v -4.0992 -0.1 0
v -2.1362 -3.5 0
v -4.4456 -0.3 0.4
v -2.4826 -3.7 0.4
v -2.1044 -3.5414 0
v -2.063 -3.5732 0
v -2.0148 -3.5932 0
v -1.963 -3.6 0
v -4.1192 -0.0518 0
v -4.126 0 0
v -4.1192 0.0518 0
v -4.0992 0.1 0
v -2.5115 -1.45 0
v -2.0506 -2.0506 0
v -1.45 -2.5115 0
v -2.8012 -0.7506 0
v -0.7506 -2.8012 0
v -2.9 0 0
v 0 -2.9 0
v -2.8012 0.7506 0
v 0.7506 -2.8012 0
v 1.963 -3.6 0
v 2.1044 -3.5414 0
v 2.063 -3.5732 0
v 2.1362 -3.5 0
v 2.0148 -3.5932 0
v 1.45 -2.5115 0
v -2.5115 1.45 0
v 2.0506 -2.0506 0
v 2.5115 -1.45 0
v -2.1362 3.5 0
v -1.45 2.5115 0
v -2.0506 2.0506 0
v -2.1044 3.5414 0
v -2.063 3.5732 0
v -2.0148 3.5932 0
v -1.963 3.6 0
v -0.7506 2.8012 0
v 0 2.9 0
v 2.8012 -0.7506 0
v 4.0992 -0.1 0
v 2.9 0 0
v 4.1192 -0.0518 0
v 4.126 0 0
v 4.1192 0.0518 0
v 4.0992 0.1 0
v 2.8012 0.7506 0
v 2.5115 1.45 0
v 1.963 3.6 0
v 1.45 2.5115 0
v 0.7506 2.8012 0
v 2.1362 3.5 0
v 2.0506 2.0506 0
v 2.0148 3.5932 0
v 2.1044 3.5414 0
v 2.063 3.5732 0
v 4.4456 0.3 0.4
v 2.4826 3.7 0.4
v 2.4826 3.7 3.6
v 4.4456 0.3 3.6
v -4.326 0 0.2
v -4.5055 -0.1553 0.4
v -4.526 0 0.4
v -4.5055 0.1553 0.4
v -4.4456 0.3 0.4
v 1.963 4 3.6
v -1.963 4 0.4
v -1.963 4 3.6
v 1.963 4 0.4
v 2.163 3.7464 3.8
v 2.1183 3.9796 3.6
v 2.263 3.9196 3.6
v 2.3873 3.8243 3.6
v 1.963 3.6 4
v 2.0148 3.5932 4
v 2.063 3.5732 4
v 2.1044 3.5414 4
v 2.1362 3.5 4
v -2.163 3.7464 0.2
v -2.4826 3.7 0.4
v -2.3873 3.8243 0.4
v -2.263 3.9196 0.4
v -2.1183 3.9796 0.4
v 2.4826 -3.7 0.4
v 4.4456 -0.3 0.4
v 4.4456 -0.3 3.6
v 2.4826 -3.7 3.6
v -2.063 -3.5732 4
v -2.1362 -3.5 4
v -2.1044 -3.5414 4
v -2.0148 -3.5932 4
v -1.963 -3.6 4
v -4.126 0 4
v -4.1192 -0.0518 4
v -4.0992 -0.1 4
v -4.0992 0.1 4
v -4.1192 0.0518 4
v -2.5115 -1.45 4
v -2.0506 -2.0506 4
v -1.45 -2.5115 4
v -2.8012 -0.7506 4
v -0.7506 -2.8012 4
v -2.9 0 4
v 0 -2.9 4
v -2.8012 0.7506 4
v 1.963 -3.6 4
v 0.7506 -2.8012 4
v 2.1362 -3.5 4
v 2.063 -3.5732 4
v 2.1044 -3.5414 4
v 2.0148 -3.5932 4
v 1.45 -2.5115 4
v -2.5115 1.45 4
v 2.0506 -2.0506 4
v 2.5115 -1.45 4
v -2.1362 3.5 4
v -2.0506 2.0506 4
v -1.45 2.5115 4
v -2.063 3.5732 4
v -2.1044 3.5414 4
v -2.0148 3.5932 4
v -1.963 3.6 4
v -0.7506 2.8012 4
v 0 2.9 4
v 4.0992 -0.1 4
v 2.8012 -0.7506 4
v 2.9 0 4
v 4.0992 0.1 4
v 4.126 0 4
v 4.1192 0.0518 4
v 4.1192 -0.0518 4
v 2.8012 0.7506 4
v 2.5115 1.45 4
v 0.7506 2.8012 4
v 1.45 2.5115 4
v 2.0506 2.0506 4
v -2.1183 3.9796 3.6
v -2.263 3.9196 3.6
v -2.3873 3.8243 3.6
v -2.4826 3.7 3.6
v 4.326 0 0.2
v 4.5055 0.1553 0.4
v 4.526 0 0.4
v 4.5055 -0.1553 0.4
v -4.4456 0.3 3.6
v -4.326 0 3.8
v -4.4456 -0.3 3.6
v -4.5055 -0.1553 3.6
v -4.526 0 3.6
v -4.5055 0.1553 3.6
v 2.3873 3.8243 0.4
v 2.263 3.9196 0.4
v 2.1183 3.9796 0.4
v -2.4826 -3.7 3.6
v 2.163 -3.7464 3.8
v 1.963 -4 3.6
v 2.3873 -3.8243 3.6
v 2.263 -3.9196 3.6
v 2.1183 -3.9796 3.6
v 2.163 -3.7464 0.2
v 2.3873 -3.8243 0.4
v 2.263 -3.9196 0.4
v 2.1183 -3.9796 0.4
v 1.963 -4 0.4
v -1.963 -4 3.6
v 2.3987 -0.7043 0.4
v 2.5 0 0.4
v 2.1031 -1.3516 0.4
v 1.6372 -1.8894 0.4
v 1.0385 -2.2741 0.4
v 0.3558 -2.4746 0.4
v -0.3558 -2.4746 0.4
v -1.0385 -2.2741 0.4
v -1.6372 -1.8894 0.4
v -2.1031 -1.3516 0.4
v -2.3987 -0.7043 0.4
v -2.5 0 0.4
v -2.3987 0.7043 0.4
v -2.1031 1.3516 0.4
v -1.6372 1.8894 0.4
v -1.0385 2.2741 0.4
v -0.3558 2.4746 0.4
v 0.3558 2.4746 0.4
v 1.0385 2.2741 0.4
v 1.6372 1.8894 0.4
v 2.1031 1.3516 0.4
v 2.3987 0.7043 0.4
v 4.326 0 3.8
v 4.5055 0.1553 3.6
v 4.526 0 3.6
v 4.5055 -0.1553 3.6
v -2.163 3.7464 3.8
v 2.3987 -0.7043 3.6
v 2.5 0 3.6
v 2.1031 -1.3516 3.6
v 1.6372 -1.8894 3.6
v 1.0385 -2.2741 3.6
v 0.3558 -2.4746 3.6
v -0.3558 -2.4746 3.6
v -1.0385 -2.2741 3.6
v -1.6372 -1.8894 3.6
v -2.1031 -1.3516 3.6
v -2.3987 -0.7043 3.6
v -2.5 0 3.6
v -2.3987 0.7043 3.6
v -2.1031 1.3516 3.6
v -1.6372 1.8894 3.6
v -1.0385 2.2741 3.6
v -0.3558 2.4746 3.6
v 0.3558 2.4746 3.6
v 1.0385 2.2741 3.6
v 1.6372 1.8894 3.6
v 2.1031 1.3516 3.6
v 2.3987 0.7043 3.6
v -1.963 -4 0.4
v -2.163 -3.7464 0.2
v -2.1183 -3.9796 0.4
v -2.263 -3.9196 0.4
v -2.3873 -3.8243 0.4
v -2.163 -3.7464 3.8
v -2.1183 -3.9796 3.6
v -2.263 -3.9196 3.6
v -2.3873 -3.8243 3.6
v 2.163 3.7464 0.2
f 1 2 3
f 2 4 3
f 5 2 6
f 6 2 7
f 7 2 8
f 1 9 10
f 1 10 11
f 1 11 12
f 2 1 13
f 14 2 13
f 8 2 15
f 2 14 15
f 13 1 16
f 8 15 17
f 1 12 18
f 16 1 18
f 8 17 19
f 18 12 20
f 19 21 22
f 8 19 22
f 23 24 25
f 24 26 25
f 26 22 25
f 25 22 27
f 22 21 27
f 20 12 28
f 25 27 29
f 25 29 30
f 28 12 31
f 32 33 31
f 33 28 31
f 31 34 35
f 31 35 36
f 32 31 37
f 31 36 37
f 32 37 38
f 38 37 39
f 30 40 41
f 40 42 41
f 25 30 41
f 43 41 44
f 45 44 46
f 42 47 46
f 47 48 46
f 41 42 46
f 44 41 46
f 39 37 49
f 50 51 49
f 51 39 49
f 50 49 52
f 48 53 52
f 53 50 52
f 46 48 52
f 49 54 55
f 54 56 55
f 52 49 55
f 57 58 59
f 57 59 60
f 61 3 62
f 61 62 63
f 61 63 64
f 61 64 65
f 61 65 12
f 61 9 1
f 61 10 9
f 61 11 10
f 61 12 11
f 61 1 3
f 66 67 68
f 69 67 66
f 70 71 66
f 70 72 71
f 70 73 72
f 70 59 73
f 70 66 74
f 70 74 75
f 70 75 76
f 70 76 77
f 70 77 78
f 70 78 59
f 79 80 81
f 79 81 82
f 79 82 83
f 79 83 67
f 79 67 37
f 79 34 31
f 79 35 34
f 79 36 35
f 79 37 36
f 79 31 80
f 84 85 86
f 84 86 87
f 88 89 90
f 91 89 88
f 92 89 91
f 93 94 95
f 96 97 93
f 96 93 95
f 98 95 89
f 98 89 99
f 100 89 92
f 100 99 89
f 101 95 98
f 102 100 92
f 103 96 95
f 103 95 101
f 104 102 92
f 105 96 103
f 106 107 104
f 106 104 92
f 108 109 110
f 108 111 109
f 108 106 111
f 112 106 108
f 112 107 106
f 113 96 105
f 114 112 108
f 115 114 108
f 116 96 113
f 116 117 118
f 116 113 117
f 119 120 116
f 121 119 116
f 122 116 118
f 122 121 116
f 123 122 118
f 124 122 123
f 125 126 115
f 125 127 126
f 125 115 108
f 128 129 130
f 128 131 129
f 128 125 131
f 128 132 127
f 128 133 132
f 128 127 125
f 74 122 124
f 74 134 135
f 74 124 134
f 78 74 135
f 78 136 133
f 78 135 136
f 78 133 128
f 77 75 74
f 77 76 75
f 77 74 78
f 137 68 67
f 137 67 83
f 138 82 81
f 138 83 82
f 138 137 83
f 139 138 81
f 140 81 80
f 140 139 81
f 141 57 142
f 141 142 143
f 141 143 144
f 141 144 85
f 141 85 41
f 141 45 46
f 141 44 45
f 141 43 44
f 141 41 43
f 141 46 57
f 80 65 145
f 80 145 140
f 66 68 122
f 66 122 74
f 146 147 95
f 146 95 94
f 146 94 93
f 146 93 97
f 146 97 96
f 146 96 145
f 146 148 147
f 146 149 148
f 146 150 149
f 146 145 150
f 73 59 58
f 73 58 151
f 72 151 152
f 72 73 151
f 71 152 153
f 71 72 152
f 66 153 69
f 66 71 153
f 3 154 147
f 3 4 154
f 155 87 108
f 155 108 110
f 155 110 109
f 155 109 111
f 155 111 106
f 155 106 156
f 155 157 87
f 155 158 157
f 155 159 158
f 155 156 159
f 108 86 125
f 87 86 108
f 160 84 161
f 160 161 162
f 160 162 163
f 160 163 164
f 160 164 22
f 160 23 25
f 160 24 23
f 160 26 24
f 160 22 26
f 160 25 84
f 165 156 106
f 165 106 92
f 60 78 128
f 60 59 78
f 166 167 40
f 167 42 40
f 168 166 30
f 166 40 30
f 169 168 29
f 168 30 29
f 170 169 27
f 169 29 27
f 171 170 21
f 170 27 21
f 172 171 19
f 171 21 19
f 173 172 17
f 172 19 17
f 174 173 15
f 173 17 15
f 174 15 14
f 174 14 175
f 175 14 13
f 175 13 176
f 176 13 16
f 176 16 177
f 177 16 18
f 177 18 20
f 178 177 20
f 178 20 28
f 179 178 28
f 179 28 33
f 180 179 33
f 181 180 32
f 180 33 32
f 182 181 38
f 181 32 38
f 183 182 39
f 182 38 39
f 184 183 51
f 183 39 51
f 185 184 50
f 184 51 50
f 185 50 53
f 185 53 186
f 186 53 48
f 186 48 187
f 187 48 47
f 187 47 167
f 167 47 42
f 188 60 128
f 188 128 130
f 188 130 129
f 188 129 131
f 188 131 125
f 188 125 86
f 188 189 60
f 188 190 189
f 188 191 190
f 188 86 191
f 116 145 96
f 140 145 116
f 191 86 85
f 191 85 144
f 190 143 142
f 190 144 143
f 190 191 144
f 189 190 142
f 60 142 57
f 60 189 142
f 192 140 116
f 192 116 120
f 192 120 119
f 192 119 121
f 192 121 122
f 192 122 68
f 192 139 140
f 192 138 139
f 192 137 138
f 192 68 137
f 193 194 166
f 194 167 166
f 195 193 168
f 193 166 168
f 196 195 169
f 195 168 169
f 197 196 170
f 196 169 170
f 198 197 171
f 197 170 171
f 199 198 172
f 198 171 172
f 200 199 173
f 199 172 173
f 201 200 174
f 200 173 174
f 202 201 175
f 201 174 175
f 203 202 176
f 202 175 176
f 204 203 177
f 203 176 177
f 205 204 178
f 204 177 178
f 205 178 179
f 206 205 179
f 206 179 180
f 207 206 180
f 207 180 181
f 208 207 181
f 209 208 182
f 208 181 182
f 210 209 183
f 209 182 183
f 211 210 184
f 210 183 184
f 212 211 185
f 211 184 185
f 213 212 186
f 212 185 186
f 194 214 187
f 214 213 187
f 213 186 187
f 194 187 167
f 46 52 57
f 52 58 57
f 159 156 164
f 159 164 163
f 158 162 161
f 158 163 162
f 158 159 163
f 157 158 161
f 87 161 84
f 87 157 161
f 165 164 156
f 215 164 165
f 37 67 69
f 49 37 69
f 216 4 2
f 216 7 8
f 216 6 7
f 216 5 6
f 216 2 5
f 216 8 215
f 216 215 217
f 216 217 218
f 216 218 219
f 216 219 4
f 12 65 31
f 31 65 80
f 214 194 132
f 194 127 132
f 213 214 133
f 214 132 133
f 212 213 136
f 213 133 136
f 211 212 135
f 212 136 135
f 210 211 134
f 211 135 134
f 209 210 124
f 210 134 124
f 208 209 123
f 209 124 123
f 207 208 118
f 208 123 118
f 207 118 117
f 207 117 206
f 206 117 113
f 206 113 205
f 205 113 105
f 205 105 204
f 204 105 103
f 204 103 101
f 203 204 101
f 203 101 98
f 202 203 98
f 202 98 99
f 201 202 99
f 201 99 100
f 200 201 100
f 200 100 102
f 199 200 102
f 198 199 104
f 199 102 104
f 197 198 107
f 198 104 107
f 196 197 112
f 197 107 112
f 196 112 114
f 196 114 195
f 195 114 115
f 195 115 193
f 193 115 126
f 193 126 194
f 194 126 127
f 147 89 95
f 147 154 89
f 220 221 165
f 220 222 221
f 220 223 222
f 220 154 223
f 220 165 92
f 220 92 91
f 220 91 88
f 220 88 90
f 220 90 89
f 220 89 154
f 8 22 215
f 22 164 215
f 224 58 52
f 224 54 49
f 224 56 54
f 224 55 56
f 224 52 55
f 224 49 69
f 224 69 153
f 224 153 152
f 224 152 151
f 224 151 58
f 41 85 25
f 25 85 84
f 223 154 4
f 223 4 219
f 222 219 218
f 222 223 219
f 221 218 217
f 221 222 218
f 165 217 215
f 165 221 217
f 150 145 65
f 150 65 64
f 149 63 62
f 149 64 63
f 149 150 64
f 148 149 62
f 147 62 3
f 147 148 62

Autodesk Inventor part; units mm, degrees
ref_plane "YZ Plane" through (0, 0, 0) normal (1, 0, 0) x (0, 1, 0)
ref_plane "XZ Plane" through (0, 0, 0) normal (0, 1, 0) x (-1, 0, 0)
ref_plane "XY Plane" through (0, 0, 0) normal (0, 0, 1) x (1, 0, 0)
sketch "Эскиз1" plane through (0, 0, 0) normal (0, 0, 1) x (1, 0, 0)
  circle A0 centre (0, 0) radius 2.5
  line L0 (2.3094, 4) -> (4.6188, 0)
  line L1 (4.6188, 0) -> (2.3094, -4)
  line L2 (2.3094, -4) -> (-2.3094, -4)
  line L3 (-2.3094, -4) -> (-4.6188, 0)
  line L4 (-4.6188, 0) -> (-2.3094, 4)
  line L5 (-2.3094, 4) -> (2.3094, 4)
  dimension "d0" = 5
  dimension "d1" = 8
extrude "Выдавливание1" add sketch "Эскиз1" along normal blind 4
fillet "Сопряжение1" radius 0.6 6 edges at (-4.6188, 0, 2) (-2.3094, -4, 2) (2.3094, -4, 2) (4.6188, 0, 2) (2.3094, 4, 2) (-2.3094, 4, 2)
chamfer "Фаска1" distance 0.4 angle 45 26 edges at (0, 4, 0) (-2.263, 3.9196, 0) (-3.4641, 2, 0) (-4.526, 0, 0) (-3.4641, -2, 0) (-2.263, -3.9196, 0) (0, -4, 0) (2.263, -3.9196, 0) (3.4641, -2, 0) (4.526, 0, 0) (3.4641, 2, 0) (2.263, 3.9196, 0) (0, 4, 4) (-2.263, 3.9196, 4) (-3.4641, 2, 4) (-4.526, 0, 4) (-3.4641, -2, 4) (-2.263, -3.9196, 4) (0, -4, 4) (2.263, -3.9196, 4) (3.4641, -2, 4) (4.526, 0, 4) (3.4641, 2, 4) (2.263, 3.9196, 4) (-2.5, 0, 4) (-2.5, 0, 0)
properties part number "Гайка М5"
